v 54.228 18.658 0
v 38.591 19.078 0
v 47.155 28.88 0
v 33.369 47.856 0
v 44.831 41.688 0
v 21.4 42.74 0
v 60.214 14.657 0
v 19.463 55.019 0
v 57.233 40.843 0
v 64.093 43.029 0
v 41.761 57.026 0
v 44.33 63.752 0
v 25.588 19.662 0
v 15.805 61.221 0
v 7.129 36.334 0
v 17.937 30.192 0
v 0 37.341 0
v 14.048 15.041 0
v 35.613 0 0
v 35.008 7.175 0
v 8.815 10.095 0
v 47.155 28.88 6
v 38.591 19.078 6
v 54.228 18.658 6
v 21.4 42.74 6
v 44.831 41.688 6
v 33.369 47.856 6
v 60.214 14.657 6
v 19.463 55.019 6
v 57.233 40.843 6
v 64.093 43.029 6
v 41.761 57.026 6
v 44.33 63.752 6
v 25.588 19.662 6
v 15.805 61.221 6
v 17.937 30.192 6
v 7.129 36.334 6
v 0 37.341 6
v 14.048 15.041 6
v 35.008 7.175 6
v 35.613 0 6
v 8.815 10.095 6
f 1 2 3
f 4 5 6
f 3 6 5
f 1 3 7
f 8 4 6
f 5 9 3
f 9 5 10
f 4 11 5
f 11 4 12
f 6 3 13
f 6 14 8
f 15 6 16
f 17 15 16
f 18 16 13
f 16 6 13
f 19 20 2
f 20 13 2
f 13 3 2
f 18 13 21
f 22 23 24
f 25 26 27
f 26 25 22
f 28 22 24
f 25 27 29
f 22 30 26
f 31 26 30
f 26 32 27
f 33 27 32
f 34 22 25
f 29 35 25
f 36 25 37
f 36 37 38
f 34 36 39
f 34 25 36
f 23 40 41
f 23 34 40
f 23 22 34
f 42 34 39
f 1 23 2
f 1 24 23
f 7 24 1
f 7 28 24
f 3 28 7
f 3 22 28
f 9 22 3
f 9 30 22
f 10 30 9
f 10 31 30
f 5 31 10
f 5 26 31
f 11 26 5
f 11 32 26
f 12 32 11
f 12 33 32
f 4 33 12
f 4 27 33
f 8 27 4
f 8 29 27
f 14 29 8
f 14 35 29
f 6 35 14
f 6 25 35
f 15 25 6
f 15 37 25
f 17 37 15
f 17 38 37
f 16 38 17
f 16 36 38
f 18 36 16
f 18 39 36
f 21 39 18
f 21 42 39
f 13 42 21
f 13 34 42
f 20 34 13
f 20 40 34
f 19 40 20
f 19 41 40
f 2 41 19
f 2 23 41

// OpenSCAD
$fn = 32;

// ----------------------------------------------------------------------
// Fan rotor section: 7 blades, 15 mm hub radius, 18 mm blades
// ----------------------------------------------------------------------

// --- parameters (mm) ---
profile_height = 6;       // extrusion height
profile_points = 21;      // points of the closed outline

profile = [[47.155, 28.88], [57.233, 40.843], [64.093, 43.029], [44.831, 41.688], [41.761, 57.026], [44.33, 63.752], [33.369, 47.856], [19.463, 55.019], [15.805, 61.221], [21.4, 42.74], [7.129, 36.334], [0, 37.341], [17.937, 30.192], [14.048, 15.041], [8.815, 10.095], [25.588, 19.662], [35.008, 7.175], [35.613, 0], [38.591, 19.078], [54.228, 18.658], [60.214, 14.657]];  // single closed polygon, 21 points, counter clockwise

// --- the one profile operation ---
linear_extrude(height = profile_height) polygon(points = profile);
